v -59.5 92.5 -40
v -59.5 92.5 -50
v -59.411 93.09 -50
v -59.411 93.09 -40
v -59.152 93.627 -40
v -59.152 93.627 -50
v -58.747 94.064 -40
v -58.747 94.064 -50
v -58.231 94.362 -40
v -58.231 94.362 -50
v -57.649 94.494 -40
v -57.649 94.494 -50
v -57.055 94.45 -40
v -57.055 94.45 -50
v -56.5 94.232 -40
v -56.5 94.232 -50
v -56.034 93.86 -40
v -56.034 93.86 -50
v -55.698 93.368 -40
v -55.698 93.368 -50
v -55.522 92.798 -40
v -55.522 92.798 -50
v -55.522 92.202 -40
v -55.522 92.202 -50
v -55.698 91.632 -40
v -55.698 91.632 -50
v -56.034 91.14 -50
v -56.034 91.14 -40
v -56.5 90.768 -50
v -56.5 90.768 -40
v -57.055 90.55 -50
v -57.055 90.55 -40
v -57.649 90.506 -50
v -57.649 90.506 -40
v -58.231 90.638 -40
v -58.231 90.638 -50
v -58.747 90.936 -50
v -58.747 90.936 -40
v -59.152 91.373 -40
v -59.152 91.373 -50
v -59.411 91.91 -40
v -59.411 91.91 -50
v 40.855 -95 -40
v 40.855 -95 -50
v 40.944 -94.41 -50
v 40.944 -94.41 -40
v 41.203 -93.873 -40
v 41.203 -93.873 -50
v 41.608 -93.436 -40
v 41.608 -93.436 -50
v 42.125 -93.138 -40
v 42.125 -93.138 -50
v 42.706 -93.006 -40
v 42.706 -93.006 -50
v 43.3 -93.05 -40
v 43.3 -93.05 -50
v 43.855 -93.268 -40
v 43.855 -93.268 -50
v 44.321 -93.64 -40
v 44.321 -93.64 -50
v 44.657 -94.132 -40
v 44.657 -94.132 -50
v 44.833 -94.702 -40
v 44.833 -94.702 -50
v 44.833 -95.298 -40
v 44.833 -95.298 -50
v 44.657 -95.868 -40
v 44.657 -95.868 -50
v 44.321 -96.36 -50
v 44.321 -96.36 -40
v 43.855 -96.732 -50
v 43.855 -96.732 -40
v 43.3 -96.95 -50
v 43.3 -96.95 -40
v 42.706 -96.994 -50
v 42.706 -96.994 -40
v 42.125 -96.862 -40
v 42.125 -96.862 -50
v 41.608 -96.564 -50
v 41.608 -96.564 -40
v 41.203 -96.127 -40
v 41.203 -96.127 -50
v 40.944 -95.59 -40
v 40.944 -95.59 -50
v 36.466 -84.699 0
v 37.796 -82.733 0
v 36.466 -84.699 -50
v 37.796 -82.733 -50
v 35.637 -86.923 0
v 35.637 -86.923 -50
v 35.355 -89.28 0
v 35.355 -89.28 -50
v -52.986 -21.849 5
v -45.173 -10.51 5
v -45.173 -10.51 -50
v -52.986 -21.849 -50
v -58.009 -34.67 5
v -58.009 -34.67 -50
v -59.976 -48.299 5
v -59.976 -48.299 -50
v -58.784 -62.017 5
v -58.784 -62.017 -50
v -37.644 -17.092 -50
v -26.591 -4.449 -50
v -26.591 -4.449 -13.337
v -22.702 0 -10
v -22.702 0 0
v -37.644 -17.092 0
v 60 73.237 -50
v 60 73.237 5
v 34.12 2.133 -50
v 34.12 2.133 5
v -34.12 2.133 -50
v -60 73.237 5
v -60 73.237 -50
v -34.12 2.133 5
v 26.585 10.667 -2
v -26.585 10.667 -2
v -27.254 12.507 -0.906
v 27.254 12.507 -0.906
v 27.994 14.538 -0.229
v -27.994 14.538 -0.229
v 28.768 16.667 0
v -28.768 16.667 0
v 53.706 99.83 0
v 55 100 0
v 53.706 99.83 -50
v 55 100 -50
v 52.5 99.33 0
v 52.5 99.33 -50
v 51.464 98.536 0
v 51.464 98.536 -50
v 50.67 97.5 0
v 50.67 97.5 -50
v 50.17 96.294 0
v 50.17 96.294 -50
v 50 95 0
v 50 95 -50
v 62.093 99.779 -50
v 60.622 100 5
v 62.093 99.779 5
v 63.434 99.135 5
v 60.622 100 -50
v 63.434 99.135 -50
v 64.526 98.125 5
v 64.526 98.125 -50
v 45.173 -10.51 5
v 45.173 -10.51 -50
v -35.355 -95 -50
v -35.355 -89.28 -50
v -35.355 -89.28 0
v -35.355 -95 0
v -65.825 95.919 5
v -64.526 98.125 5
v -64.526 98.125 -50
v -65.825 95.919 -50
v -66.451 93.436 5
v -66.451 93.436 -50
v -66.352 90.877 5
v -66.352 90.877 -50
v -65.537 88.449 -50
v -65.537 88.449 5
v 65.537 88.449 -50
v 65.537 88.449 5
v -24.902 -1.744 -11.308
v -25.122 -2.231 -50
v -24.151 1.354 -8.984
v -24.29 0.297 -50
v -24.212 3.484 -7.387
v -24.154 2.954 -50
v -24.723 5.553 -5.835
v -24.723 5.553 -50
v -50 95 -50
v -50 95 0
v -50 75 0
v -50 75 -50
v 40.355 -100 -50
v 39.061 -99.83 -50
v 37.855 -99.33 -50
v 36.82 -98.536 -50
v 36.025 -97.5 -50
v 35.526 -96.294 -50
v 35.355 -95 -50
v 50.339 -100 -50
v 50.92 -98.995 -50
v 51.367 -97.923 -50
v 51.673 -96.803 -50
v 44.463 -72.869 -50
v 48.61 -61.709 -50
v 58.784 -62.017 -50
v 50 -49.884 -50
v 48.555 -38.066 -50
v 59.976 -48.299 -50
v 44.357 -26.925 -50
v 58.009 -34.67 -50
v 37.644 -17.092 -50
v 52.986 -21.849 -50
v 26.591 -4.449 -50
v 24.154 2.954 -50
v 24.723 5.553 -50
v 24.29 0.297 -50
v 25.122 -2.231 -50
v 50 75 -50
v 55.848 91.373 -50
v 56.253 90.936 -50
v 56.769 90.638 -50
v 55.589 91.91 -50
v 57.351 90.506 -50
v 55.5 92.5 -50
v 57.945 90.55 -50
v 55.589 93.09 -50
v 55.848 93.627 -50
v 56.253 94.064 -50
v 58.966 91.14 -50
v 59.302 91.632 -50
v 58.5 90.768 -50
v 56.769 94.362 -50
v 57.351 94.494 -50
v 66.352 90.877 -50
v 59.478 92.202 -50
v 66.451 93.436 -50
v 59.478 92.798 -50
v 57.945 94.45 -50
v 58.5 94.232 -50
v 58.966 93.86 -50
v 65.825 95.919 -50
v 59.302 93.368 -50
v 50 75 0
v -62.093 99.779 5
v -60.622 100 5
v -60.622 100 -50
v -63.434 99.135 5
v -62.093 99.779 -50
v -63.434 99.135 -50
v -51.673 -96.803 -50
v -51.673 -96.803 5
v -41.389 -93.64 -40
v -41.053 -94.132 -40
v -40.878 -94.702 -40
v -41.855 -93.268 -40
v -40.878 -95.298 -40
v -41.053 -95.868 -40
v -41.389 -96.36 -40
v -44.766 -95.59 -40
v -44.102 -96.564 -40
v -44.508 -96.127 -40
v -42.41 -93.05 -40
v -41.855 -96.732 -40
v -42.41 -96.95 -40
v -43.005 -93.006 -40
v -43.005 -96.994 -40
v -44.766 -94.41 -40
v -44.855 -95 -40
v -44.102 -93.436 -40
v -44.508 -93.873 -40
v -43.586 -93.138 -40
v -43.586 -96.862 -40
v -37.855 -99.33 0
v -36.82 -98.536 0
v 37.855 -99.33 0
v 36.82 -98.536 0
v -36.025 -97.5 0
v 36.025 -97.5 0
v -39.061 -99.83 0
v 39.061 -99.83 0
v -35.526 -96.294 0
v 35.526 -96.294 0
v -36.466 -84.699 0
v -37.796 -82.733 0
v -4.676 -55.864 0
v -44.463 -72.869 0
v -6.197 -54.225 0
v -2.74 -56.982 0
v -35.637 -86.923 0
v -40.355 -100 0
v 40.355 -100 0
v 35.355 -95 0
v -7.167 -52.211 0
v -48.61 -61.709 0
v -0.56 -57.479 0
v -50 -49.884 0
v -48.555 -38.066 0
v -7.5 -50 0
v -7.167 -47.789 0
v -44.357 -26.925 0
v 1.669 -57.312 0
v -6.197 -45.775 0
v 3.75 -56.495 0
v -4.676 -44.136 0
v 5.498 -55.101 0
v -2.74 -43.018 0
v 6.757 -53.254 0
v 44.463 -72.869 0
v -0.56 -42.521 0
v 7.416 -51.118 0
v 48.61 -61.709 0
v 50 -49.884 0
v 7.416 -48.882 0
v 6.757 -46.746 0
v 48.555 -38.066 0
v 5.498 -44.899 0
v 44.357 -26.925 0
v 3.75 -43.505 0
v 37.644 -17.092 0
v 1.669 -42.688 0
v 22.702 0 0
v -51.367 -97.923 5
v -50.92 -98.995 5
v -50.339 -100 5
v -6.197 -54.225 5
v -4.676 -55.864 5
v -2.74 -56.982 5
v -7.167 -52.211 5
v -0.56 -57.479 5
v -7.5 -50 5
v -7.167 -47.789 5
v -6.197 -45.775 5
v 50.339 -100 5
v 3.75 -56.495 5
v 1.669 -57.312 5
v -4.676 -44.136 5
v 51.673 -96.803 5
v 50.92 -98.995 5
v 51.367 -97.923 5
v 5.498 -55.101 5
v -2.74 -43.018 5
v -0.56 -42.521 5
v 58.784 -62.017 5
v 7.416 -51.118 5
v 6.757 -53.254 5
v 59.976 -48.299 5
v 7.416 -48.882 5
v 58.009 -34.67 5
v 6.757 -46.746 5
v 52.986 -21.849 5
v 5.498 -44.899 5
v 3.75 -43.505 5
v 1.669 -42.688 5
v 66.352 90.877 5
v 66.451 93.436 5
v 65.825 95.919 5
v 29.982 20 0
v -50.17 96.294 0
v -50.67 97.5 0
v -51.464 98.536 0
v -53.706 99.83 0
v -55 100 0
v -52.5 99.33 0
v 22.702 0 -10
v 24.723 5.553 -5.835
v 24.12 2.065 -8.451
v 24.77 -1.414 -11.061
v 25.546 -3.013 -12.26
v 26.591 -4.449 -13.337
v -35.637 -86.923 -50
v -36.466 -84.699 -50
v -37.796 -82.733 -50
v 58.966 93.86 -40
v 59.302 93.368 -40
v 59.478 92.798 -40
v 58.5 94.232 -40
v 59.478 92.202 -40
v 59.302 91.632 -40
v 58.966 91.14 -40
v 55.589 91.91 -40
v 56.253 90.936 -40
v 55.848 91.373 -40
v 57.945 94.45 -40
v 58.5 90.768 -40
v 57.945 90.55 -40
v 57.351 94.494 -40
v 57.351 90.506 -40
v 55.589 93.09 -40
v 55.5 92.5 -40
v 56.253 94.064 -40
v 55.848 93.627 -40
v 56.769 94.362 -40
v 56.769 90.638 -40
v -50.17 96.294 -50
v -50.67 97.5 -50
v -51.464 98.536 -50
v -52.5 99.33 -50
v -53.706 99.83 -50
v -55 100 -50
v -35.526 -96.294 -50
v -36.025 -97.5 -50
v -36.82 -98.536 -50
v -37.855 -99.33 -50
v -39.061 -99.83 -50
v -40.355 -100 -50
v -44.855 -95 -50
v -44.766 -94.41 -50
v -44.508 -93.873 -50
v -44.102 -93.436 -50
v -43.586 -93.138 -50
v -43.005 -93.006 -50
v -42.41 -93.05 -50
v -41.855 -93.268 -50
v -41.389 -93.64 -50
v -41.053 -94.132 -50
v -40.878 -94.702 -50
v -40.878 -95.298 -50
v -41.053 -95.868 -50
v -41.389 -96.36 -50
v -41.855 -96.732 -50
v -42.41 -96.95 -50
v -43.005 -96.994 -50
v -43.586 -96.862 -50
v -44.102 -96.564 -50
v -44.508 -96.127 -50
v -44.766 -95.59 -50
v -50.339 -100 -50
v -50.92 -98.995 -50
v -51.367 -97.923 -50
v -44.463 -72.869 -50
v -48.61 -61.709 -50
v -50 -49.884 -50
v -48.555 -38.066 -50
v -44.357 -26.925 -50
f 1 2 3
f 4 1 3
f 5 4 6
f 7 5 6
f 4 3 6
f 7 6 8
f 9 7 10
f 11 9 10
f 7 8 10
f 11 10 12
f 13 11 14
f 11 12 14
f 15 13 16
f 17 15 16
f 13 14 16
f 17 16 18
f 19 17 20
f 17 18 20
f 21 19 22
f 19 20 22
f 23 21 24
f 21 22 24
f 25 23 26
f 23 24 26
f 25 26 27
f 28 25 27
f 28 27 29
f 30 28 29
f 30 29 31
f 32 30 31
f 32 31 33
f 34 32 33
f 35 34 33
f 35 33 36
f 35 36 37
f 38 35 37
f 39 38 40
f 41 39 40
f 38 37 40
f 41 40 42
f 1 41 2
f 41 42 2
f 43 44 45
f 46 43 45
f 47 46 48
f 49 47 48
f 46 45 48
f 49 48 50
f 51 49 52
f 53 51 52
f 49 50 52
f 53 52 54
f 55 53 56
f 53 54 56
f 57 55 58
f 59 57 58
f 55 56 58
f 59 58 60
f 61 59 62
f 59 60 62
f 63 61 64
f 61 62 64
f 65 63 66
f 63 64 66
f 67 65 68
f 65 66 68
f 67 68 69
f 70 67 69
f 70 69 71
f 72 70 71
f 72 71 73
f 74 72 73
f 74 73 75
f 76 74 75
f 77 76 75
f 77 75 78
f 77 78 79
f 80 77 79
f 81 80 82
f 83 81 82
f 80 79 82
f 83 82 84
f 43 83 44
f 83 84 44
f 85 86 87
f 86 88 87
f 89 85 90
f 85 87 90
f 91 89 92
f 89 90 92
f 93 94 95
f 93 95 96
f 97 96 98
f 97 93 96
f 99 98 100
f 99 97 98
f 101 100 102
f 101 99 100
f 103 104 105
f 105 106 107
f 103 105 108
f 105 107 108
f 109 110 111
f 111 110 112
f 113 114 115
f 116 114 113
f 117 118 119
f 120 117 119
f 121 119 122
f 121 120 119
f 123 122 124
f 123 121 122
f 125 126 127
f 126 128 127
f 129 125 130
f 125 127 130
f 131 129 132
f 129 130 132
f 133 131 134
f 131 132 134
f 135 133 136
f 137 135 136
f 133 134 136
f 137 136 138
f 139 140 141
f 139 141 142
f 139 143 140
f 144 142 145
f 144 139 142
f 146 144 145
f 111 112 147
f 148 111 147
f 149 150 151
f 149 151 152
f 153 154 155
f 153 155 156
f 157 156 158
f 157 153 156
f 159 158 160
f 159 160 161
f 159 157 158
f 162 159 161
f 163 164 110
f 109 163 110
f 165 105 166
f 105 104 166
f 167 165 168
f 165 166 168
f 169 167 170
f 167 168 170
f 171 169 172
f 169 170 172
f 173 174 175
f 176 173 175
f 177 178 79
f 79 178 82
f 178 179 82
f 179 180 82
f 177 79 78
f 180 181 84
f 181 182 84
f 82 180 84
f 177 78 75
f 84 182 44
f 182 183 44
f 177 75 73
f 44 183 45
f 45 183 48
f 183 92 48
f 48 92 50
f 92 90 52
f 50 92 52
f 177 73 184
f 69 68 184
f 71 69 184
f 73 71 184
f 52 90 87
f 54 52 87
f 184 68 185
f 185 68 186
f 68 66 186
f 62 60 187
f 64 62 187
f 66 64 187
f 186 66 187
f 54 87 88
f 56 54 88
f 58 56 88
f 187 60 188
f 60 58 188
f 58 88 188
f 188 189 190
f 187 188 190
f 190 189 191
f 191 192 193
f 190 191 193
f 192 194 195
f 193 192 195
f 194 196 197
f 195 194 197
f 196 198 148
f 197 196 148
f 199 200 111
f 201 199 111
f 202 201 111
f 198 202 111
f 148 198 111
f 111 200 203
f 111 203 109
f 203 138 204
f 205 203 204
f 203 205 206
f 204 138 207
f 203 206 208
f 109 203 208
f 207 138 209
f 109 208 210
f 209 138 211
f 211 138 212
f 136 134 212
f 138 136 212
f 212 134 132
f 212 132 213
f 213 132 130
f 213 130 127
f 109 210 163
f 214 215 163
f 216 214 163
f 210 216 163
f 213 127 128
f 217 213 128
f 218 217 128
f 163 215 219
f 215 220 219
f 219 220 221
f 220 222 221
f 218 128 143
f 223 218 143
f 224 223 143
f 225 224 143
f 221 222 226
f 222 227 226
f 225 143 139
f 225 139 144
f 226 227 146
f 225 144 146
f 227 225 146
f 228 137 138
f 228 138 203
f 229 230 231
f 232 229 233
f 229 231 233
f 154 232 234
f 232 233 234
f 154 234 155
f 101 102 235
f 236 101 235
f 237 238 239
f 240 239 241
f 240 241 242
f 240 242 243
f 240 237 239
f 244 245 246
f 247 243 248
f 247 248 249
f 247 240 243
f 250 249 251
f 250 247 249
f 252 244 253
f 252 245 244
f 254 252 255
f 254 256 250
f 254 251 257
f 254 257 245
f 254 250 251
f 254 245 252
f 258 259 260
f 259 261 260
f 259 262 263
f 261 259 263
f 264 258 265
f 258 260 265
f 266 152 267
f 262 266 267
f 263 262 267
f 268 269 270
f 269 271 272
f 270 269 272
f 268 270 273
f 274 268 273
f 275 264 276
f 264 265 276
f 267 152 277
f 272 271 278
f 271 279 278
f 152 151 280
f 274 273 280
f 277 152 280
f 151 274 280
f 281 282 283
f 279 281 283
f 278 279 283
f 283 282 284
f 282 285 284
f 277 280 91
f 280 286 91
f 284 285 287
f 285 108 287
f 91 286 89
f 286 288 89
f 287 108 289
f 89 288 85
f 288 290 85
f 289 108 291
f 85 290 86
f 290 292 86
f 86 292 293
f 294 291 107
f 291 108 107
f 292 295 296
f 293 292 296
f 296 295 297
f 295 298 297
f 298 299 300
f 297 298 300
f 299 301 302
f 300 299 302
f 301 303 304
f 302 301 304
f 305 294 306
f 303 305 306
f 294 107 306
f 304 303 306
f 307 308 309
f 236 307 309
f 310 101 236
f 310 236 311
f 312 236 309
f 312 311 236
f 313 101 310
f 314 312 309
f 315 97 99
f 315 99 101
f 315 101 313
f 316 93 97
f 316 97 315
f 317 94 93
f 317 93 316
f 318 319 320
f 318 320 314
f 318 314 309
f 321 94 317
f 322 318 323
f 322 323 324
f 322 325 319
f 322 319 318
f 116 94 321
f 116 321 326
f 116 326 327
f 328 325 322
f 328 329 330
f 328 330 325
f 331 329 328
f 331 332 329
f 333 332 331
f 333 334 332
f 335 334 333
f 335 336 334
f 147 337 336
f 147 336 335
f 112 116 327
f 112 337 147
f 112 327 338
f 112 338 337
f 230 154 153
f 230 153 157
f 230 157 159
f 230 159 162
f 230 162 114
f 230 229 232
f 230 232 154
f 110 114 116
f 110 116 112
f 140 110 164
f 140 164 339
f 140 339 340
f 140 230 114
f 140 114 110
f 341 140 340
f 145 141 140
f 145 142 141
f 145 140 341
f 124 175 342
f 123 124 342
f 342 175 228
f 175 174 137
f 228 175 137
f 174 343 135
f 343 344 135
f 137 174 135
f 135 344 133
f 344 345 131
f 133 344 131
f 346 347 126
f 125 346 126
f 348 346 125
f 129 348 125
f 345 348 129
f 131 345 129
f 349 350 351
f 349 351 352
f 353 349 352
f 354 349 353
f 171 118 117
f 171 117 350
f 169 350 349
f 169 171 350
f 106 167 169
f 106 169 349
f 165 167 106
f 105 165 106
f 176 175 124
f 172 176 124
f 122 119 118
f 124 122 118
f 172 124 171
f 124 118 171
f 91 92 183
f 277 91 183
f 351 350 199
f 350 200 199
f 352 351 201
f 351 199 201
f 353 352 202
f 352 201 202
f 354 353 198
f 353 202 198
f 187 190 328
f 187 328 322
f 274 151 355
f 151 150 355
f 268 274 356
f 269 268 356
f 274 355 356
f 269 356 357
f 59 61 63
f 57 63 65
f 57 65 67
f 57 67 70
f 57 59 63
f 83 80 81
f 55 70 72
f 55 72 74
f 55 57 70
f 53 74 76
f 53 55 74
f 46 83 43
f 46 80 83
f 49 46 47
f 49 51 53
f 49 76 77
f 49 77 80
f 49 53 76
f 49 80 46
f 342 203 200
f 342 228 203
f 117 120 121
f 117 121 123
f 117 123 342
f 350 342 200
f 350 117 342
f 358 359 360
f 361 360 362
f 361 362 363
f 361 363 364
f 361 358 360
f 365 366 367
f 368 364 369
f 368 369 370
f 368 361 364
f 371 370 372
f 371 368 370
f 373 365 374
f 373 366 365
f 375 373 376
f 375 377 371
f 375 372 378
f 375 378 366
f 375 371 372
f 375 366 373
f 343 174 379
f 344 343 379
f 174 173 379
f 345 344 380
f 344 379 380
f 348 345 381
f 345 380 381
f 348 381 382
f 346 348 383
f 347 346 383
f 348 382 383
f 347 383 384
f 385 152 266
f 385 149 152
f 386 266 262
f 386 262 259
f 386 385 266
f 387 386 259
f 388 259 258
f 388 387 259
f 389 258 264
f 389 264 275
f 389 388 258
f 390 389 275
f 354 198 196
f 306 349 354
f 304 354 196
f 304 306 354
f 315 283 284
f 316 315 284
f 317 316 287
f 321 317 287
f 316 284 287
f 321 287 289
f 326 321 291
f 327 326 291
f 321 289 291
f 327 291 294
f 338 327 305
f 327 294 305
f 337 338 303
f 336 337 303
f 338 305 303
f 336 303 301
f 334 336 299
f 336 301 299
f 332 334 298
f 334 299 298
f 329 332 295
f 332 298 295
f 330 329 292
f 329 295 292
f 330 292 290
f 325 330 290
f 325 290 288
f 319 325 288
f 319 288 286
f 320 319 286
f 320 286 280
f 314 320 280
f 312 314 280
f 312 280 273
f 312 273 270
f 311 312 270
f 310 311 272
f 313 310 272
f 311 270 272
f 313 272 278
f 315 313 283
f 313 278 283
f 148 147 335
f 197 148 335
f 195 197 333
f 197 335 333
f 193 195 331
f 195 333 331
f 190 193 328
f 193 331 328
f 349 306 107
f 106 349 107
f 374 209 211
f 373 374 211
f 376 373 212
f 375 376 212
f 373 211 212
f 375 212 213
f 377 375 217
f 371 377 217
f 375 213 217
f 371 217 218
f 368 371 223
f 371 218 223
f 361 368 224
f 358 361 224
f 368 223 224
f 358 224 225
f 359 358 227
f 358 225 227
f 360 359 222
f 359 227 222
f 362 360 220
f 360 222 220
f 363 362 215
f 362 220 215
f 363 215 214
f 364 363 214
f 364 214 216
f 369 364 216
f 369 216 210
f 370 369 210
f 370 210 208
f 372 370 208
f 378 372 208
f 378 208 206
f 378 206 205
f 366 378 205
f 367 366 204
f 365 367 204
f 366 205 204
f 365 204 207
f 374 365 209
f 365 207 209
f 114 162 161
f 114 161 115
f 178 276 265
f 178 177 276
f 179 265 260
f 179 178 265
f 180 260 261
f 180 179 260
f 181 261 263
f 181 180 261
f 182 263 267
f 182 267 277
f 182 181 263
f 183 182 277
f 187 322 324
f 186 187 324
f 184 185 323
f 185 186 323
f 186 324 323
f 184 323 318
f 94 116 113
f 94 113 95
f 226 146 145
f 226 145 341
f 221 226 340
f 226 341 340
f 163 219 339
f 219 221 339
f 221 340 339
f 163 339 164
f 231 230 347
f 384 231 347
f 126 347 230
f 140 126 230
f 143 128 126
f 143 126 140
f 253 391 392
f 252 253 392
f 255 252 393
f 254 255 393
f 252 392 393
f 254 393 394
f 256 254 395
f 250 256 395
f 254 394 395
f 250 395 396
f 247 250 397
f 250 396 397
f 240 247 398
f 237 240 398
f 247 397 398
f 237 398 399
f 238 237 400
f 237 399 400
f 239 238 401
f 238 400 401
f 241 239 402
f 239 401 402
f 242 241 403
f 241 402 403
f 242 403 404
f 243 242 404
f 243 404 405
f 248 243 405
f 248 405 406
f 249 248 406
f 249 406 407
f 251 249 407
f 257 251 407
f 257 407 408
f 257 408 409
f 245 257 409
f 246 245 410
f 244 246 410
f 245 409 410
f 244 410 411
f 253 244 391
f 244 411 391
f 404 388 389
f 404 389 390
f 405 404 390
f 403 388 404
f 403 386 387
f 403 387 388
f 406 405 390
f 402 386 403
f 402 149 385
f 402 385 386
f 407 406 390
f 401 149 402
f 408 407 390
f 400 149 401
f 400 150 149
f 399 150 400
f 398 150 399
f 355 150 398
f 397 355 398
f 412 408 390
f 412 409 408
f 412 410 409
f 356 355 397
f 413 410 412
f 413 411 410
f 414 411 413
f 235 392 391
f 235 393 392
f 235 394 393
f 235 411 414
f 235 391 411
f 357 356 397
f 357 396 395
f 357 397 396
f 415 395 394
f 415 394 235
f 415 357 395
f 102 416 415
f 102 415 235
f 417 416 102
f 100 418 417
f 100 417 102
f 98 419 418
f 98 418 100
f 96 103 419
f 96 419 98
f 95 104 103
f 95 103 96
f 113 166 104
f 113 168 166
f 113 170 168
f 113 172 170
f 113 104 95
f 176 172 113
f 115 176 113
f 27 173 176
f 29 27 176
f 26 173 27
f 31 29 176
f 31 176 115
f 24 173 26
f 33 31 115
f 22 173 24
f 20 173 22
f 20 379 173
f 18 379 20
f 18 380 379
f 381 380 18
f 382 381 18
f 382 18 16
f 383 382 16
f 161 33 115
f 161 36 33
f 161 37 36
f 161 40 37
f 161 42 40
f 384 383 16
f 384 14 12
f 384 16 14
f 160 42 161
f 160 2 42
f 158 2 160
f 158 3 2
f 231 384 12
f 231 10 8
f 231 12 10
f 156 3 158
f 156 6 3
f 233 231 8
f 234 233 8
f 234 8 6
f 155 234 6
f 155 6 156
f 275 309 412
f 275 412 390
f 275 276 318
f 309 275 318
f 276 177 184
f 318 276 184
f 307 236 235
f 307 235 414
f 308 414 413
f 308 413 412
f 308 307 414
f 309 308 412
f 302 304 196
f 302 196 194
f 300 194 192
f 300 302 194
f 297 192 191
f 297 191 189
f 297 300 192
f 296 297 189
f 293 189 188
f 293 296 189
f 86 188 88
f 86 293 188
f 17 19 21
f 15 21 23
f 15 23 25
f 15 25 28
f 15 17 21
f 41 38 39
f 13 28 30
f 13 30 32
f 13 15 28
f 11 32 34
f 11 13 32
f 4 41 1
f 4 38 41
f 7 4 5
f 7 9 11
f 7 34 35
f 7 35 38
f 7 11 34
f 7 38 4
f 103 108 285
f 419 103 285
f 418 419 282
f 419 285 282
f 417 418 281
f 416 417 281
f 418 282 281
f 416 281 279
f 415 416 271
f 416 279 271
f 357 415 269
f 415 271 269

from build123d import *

# Parameters (mm, degrees)
BOSS_EXTRUDE1_DEPTH     = 50
BOSS_EXTRUDE1_2_DEPTH   = 50
BOSS_EXTRUDE2_DEPTH     = 10
CHAMFER1_SIZE           = 15
CHAMFER1_SIZE_2         = 20
SKETCH4_W               = 160
SKETCH4_H               = 200
BOSS_EXTRUDE3_DEPTH     = 5
FILLET1_R               = 10
SKETCH5_R               = 7.5
CUT_EXTRUDE1_DEPTH      = 5
CUT_EXTRUDE5_DEPTH      = 140.373598648
CUT_EXTRUDE5_DEPTH_BACK = 140.373598648
FILLET4_R               = 5
SKETCH12_R              = 2
CUT_EXTRUDE6_DEPTH      = 10


with BuildPart() as part:
    # Sketch2 → Boss-Extrude1 (new body)
    with BuildSketch(Plane.XY):
        with BuildLine():
            Line((-50, 75), (-22.70223243, 0))
            Line((-22.70223243, 0), (-37.64392369, -17.092022104))
            ThreePointArc((-37.64392369, -17.092022104), (-49.971924127, -51.675350432), (-35.355339059, -85.355339059))
            Line((-35.355339059, -85.355339059), (-35.355339059, -100))
            Line((-35.355339059, -100), (-80, -100))
            Line((-80, -100), (-80, 100))
            Line((-80, 100), (-50, 100))
            Line((-50, 100), (-50, 75))
        make_face()
    extrude(amount=-BOSS_EXTRUDE1_DEPTH)



with BuildPart() as body_2:
    # Sketch2 → Boss-Extrude1 2 (new body)
    with BuildSketch(Plane.XY):
        with BuildLine():
            Line((50, 75), (22.70223243, 0))
            Line((22.70223243, 0), (37.64392369, -17.092022104))
            ThreePointArc((37.64392369, -17.092022104), (49.971924127, -51.675350432), (35.355339059, -85.355339059))
            Line((35.355339059, -85.355339059), (35.355339059, -100))
            Line((35.355339059, -100), (80, -100))
            Line((80, -100), (80, 100))
            Line((80, 100), (50, 100))
            Line((50, 100), (50, 75))
        make_face()
    extrude(amount=-BOSS_EXTRUDE1_2_DEPTH)


with BuildPart() as part_1:
    add(part.part)

    add(body_2.part)  # Boss-Extrude2 merges body 2
    # Sketch3 → Boss-Extrude2 (add)
    with BuildSketch(Plane.XY):
        Polygon((-29.981637115, 20), (29.981637115, 20), (22.70223243, 0), (-22.70223243, 0), align=None)
    extrude(amount=-BOSS_EXTRUDE2_DEPTH)

    # Chamfer1
    # the kernel refuses this chamfer: 20, 15 mm, written as the material it takes off along each edge
    with BuildSketch(Plane(origin=(-81.595588718, 20, -10), x_dir=(0, 0.041308380137954244, 0.9991464445867674), z_dir=(1, 0, 0))) as chamfer1_piece_1_section:
        Polygon((CHAMFER1_SIZE * 0.999146444587, CHAMFER1_SIZE * 0.041308380138), (-CHAMFER1_SIZE_2 * 0.041308380138, CHAMFER1_SIZE_2 * 0.999146444587), (0, 0), align=None)
    chamfer1_piece_1 = extrude(amount=163.191177435, mode=Mode.PRIVATE)
    chamfer1_piece_1 = split(chamfer1_piece_1, bisect_by=Plane(origin=(-24.447399798, 4.794807938, -4.975922198), z_dir=(0.9396926207859094, 0.3420201433256661, 0)), keep=Keep.TOP, mode=Mode.PRIVATE)
    chamfer1_piece_1 = split(chamfer1_piece_1, bisect_by=Plane(origin=(24.447399798, 4.794807938, -4.975922198), z_dir=(-0.939692620785907, 0.34202014332567265, 0)), keep=Keep.TOP, mode=Mode.PRIVATE)
    add(chamfer1_piece_1, mode=Mode.SUBTRACT)

    # Sketch4 → Boss-Extrude3 (add)
    with BuildSketch(Plane.XY):
        Rectangle(SKETCH4_W, SKETCH4_H)
    extrude(amount=BOSS_EXTRUDE3_DEPTH)

    # Fillet1
    fillet1_edges = [part_1.edges().sort_by_distance(p)[0] for p in [
        (-22.70223243, 0, -30),
        (-35.355339059, -85.355339059, -25),
        (35.355339059, -85.355339059, -25),
        (22.70223243, 0, -30),
        (0, 13.333333333, 0),
    ]]
    fillet(fillet1_edges, radius=FILLET1_R)

    # Sketch5 → Cut-Extrude1 (cut)
    with BuildSketch(Plane(origin=(0, 0, 0), x_dir=(-1, 0, 0), z_dir=(0, 0, -1))):
        with Locations((0, -50)):
            Circle(SKETCH5_R)
    extrude(amount=-CUT_EXTRUDE1_DEPTH, mode=Mode.SUBTRACT)

    # Sketch11 → Cut-Extrude5 (cut, two sides: drawn at the far end of the back side and taken through both)
    with BuildSketch(Plane(origin=(0, 0, -50), x_dir=(-1, 0, 0), z_dir=(0, 0, -1)).offset(-CUT_EXTRUDE5_DEPTH_BACK)):
        with BuildLine():
            Line((-58.784198233, -62.017405631), (-51.672968794, -96.802610845))
            ThreePointArc((-51.672968794, -96.802610845), (-51.161121522, -98.466118532), (-50.338653833, -100))
            Line((-50.338653833, -100), (-80, -100))
            Line((-80, -100), (-80, 100))
            Line((-80, 100), (-62.474937186, 100))
            ThreePointArc((-62.474937186, 100), (-66.199502533, 94.806221081), (-65.536970349, 88.4494312))
            Line((-65.536970349, 88.4494312), (-60, 73.236730193))
            Line((-60, 73.236730193), (-34.120235365, 2.132661237))
            Line((-34.120235365, 2.132661237), (-45.172708428, -10.510426525))
            ThreePointArc((-45.172708428, -10.510426525), (-58.008635864, -34.670350128), (-58.784198233, -62.017405631))
        make_face()
        with BuildLine():
            Line((34.120235365, 2.132661237), (45.172708428, -10.510426525))
            ThreePointArc((45.172708428, -10.510426525), (58.008635864, -34.670350128), (58.784198233, -62.017405631))
            Line((58.784198233, -62.017405631), (51.672968794, -96.802610845))
            ThreePointArc((51.672968794, -96.802610845), (51.161121522, -98.466118532), (50.338653833, -100))
            Line((50.338653833, -100), (80, -100))
            Line((80, -100), (80, 100))
            Line((80, 100), (62.474937186, 100))
            ThreePointArc((62.474937186, 100), (66.199502533, 94.806221081), (65.536970349, 88.4494312))
            Line((65.536970349, 88.4494312), (60, 73.236730193))
            Line((60, 73.236730193), (34.120235365, 2.132661237))
        make_face()
    extrude(amount=CUT_EXTRUDE5_DEPTH + CUT_EXTRUDE5_DEPTH_BACK, mode=Mode.SUBTRACT)

    # Fillet4
    fillet4_edges = [part_1.edges().sort_by_distance(p)[0] for p in [
        (-35.355339059, -100, -25),
        (-50, 100, -25),
        (62.474937186, 100, -22.5),
        (-62.474937186, 100, -22.5),
        (50, 100, -25),
        (35.355339059, -100, -25),
    ]]
    fillet(fillet4_edges, radius=FILLET4_R)

    # Sketch12 → Cut-Extrude6 (cut)
    with BuildSketch(Plane(origin=(0, 0, -50), x_dir=(-1, 0, 0), z_dir=(0, 0, -1))):
        with Locations((-57.5, 92.5)):
            Circle(SKETCH12_R)
        with Locations((57.5, 92.5)):
            Circle(SKETCH12_R)
        with Locations((-42.855339059, -95)):
            Circle(SKETCH12_R)
        with Locations((42.855339059, -95)):
            Circle(SKETCH12_R)
    extrude(amount=-CUT_EXTRUDE6_DEPTH, mode=Mode.SUBTRACT)


solid = part_1.part
